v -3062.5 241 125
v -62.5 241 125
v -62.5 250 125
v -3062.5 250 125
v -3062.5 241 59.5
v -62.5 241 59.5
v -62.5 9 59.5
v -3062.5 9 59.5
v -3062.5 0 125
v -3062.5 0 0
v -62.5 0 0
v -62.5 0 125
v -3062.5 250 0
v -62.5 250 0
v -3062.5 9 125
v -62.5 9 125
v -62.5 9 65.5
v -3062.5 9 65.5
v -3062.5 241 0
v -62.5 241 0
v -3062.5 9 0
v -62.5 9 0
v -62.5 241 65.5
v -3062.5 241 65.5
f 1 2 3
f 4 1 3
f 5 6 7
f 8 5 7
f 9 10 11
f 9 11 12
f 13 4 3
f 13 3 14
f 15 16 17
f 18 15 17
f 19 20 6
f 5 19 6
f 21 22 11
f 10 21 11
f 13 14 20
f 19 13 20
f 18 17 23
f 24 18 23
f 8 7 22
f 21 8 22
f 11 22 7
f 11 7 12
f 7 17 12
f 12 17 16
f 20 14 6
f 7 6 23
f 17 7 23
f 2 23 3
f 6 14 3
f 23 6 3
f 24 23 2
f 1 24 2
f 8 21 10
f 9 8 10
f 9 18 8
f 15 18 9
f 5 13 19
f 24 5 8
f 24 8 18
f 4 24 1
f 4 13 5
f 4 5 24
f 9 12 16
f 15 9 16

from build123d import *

# Parameters (mm, degrees)
F1_DEPTH = 3000
F2_ANGLE = 90


with BuildPart() as f1:
    # F0 (on Top) → F1 (new body)
    with BuildSketch(Plane.XY):
        Polygon((62.5, 250), (0, 250), (-62.5, 250), (-62.5, 241), (-3, 241), (-3, 9), (-62.5, 9), (-62.5, 0), (0, 0), (62.5, 0), (62.5, 9), (3, 9), (3, 241), (62.5, 241), align=None)
    extrude(amount=F1_DEPTH)


with BuildPart() as f1_1:
    # F2: moved
    add(f1.part.rotate(Axis((-62.5, 4.5, 0), (0, -1, 0)), F2_ANGLE))


solid = f1_1.part
